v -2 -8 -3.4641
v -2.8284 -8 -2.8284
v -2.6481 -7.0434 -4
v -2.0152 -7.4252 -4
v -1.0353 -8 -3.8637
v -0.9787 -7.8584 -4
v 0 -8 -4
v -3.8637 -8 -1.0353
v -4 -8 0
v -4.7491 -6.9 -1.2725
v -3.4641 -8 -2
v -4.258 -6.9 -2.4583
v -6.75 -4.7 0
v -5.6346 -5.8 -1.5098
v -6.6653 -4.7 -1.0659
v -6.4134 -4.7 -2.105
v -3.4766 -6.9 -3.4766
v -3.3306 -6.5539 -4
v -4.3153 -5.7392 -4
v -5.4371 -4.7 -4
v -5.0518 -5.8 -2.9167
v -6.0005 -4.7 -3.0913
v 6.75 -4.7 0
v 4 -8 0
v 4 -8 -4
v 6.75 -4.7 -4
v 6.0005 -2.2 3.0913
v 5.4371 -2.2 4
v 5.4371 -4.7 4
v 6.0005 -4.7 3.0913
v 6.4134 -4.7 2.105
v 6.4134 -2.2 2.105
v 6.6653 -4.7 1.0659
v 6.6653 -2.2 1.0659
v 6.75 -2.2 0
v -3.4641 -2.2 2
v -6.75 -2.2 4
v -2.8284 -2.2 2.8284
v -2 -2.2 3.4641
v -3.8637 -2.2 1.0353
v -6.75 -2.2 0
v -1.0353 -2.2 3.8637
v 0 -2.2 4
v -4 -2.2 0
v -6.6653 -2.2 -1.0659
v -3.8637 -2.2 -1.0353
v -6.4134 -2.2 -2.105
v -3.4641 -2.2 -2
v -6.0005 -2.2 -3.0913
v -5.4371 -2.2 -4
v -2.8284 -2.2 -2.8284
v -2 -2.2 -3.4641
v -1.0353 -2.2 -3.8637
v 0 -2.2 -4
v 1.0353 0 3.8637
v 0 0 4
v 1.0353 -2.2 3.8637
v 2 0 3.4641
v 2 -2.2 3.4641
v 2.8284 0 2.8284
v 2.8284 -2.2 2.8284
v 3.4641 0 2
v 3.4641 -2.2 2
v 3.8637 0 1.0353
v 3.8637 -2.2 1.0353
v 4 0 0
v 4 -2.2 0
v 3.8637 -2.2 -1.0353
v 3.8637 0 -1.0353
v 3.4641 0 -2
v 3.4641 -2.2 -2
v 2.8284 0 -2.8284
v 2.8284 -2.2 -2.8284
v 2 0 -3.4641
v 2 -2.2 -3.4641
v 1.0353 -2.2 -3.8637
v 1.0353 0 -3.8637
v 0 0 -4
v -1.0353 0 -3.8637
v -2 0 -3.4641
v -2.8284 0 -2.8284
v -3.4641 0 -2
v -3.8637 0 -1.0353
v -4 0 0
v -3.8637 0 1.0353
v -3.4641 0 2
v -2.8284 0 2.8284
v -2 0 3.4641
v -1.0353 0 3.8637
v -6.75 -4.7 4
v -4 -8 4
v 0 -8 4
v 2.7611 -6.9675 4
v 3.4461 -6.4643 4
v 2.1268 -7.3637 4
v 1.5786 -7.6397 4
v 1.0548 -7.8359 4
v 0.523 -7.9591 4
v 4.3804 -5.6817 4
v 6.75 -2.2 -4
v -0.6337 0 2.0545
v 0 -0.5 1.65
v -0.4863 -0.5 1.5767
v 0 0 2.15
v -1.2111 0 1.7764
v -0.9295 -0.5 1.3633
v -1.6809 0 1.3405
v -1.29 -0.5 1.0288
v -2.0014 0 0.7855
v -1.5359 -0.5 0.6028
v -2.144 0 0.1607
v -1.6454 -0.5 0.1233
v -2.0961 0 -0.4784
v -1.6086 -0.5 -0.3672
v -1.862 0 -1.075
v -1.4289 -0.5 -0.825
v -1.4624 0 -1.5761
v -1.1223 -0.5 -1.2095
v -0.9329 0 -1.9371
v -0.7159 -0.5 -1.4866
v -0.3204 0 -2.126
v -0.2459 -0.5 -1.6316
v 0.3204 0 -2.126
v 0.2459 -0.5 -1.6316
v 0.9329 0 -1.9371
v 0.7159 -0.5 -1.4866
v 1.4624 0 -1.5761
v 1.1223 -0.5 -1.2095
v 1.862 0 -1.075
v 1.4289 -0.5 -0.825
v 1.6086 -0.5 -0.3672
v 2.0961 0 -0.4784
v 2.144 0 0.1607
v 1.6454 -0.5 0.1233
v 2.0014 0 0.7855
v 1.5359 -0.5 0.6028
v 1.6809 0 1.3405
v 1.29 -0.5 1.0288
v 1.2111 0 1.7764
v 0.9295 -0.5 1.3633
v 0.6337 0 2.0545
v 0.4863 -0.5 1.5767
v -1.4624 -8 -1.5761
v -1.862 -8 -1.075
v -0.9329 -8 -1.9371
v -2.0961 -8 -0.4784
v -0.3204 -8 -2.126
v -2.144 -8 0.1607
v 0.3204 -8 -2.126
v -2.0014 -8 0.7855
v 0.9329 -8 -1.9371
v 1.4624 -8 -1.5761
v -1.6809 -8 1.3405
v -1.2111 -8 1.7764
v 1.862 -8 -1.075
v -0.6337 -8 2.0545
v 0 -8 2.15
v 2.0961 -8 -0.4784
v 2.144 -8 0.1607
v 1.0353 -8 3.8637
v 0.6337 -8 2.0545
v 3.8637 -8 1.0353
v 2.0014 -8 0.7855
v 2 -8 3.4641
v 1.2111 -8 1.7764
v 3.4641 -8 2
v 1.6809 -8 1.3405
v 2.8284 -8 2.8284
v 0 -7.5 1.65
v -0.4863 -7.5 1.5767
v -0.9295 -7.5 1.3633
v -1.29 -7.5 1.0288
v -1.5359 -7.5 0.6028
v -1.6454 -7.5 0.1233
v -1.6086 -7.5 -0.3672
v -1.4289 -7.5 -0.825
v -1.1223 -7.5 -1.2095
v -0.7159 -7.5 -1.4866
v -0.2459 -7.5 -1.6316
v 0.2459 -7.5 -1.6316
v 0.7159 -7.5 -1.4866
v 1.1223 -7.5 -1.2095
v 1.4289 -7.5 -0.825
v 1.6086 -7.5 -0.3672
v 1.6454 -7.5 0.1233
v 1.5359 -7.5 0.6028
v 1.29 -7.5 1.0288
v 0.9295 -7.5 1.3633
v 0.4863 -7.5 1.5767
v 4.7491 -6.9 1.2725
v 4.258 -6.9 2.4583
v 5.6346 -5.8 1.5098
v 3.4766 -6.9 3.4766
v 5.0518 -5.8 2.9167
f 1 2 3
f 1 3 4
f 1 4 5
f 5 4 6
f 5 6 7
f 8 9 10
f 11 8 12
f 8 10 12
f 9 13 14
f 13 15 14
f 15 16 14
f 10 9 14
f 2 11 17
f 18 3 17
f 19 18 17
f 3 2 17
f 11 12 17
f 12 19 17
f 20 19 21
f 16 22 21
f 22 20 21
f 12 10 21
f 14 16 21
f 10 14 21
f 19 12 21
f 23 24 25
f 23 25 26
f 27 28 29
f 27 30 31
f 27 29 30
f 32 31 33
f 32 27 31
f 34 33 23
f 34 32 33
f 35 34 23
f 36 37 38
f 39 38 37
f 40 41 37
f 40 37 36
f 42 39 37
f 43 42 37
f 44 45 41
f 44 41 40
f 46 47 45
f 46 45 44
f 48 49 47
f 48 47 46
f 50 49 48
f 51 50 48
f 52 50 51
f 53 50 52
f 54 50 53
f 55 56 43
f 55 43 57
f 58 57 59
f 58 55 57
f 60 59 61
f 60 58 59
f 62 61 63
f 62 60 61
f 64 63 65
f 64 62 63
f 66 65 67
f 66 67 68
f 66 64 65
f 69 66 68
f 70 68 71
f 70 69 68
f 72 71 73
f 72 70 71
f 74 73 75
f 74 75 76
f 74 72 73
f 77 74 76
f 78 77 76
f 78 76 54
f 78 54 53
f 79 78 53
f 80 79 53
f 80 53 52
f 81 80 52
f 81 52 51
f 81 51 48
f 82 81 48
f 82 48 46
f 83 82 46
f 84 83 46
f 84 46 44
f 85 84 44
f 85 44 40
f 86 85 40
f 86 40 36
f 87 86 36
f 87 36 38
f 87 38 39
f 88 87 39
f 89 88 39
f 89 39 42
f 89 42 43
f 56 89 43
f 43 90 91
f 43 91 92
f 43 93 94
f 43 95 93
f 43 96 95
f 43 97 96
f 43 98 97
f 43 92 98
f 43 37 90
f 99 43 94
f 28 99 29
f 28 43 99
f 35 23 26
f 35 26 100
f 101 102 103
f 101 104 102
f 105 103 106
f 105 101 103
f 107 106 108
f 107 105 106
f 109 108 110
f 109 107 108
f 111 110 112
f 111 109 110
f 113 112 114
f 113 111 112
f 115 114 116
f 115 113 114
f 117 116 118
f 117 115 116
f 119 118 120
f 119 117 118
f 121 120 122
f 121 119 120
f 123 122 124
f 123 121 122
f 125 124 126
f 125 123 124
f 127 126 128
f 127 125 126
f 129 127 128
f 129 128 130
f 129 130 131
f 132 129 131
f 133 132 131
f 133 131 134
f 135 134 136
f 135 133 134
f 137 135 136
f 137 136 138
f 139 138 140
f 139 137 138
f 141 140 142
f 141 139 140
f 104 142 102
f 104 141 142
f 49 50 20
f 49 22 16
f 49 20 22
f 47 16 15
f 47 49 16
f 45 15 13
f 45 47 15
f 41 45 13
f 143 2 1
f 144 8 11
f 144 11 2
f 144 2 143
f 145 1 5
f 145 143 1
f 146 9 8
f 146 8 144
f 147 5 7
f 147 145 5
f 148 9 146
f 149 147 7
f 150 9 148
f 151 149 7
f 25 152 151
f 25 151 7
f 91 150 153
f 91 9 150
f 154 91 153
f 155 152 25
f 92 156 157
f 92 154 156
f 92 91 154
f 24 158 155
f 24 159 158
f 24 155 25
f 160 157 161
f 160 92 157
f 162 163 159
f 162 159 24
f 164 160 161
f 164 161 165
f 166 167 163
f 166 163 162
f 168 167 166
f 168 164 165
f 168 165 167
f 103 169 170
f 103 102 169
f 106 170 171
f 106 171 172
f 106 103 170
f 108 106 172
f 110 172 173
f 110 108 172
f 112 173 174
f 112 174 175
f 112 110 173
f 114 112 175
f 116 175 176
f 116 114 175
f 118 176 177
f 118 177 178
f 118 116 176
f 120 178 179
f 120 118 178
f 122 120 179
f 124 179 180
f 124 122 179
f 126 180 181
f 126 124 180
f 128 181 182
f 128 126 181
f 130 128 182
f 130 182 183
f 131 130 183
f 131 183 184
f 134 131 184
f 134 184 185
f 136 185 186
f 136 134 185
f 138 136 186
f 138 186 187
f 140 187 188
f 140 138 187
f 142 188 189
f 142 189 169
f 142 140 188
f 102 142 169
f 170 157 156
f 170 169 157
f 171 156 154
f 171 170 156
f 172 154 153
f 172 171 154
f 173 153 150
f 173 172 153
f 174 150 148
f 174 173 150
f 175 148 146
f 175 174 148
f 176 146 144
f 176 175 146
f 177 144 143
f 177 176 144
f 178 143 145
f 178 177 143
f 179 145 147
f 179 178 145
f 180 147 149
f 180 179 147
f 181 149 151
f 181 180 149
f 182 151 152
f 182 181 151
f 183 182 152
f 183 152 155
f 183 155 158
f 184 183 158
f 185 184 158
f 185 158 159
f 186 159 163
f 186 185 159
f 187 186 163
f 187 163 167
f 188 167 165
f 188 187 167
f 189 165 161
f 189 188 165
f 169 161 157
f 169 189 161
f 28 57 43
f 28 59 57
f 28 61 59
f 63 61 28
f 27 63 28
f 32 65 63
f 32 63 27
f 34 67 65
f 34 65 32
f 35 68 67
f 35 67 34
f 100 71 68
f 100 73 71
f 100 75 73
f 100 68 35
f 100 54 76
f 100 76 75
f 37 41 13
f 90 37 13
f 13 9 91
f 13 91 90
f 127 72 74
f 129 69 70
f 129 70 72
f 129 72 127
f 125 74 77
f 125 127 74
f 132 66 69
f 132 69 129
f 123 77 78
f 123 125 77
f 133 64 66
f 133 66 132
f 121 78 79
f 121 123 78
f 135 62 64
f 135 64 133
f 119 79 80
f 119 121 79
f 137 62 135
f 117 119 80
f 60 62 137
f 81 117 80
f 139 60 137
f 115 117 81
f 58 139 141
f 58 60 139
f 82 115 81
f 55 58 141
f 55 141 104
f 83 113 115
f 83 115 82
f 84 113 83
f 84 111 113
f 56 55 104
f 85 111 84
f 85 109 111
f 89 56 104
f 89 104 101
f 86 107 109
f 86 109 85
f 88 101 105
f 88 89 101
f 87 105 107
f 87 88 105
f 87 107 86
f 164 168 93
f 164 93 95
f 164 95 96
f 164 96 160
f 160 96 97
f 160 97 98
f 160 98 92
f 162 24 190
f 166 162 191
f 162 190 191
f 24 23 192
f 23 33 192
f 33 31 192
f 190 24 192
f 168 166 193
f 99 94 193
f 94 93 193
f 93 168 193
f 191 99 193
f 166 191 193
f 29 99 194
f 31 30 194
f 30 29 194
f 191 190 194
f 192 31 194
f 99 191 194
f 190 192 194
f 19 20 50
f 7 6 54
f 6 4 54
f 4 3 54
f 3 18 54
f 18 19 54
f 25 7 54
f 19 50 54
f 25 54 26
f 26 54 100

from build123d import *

# Parameters (mm, degrees)
EXTRUDE_1_DEPTH     = 4
SKETCH_4_OUTSIDE_W  = 19.022
SKETCH_4_OUTSIDE_H  = 13.522
SKETCH_4_OUTSIDE_R  = 4
CUT_EXTRUDE_1_DEPTH = 2.2
CUT_EXTRUDE_2_DEPTH = 6.8


with BuildPart() as part:
    # Эскиз1 → Бобышка-Вытянуть1 (new body, symmetric)
    with BuildSketch(Plane.XY):
        Polygon((4, 0), (-4, 0), (-4, -2.2), (-6.75, -2.2), (-6.75, -8), (6.75, -8), (6.75, -2.2), (4, -2.2), align=None)
    extrude(amount=EXTRUDE_1_DEPTH, both=True)

    # Эскиз3 → Отверстие обработанное метчиком M41 (revolve, cut)
    with BuildSketch(Plane(origin=(0, 0, 0), x_dir=(0, 0, 1), z_dir=(1, 0, 0))):
        Polygon((0, 0), (0, 8), (2.15, 8), (1.65, 7.5), (1.65, 0.5), (2.15, 0), align=None)
    revolve(axis=Axis((0, 6.35, 0), (0, -1, 0)), mode=Mode.SUBTRACT)

    # Эскиз4 outside → Вырез-Вытянуть1 (cut)
    with BuildSketch(Plane(origin=(0, 0, 0), x_dir=(1, 0, 0), z_dir=(0, 1, 0))):
        Rectangle(SKETCH_4_OUTSIDE_W, SKETCH_4_OUTSIDE_H)
        with Locations(Location((0, 0, 0), (0, 0, 270))):  # turned: the seam where the file's is
            Circle(SKETCH_4_OUTSIDE_R, mode=Mode.SUBTRACT)
    extrude(amount=-CUT_EXTRUDE_1_DEPTH, mode=Mode.SUBTRACT)

    # Эскиз5 → Вырез-Вытянуть2 (cut, through all)
    with BuildSketch(Plane(origin=(0, -2.2, 0), x_dir=(1, 0, 0), z_dir=(0, 1, 0))):
        with BuildLine():
            Line((-6.75, 0), (-6.75, 4))
            Line((-6.75, 4), (-5.437140793, 4))
            ThreePointArc((-5.437140793, 4), (-6.413392252, 2.104970267), (-6.75, 0))
        make_face()
        with BuildLine():
            Line((6.75, 0), (6.75, -4))
            Line((6.75, -4), (5.437140793, -4))
            ThreePointArc((5.437140793, -4), (6.413392252, -2.104970267), (6.75, 0))
        make_face()
    extrude(amount=-CUT_EXTRUDE_2_DEPTH, mode=Mode.SUBTRACT)

    # Вырез-По траектории1: sweep along a path in Эскиз7
    with BuildLine(Plane.XZ.offset(8)) as sweep_1_path:
        Line((0, 6.75), (-6.75, 6.75))
        Line((-6.75, 6.75), (-6.75, 0))
        ThreePointArc((-6.75, 0), (-4.772970773, -4.772970773), (0, -6.75))
        Line((0, -6.75), (6.75, -6.75))
        Line((6.75, -6.75), (6.75, 0))
        ThreePointArc((6.75, 0), (4.772970773, 4.772970773), (0, 6.75))
    # Эскиз6 → Вырез-По траектории1 (sweep, cut)
    with BuildSketch(Plane.XY.offset(4)):
        Polygon((-6.75, -4.7), (-6.75, -8), (-4, -8), align=None)
    sweep(path=sweep_1_path.line, transition=Transition.RIGHT, mode=Mode.SUBTRACT)


solid = part.part
